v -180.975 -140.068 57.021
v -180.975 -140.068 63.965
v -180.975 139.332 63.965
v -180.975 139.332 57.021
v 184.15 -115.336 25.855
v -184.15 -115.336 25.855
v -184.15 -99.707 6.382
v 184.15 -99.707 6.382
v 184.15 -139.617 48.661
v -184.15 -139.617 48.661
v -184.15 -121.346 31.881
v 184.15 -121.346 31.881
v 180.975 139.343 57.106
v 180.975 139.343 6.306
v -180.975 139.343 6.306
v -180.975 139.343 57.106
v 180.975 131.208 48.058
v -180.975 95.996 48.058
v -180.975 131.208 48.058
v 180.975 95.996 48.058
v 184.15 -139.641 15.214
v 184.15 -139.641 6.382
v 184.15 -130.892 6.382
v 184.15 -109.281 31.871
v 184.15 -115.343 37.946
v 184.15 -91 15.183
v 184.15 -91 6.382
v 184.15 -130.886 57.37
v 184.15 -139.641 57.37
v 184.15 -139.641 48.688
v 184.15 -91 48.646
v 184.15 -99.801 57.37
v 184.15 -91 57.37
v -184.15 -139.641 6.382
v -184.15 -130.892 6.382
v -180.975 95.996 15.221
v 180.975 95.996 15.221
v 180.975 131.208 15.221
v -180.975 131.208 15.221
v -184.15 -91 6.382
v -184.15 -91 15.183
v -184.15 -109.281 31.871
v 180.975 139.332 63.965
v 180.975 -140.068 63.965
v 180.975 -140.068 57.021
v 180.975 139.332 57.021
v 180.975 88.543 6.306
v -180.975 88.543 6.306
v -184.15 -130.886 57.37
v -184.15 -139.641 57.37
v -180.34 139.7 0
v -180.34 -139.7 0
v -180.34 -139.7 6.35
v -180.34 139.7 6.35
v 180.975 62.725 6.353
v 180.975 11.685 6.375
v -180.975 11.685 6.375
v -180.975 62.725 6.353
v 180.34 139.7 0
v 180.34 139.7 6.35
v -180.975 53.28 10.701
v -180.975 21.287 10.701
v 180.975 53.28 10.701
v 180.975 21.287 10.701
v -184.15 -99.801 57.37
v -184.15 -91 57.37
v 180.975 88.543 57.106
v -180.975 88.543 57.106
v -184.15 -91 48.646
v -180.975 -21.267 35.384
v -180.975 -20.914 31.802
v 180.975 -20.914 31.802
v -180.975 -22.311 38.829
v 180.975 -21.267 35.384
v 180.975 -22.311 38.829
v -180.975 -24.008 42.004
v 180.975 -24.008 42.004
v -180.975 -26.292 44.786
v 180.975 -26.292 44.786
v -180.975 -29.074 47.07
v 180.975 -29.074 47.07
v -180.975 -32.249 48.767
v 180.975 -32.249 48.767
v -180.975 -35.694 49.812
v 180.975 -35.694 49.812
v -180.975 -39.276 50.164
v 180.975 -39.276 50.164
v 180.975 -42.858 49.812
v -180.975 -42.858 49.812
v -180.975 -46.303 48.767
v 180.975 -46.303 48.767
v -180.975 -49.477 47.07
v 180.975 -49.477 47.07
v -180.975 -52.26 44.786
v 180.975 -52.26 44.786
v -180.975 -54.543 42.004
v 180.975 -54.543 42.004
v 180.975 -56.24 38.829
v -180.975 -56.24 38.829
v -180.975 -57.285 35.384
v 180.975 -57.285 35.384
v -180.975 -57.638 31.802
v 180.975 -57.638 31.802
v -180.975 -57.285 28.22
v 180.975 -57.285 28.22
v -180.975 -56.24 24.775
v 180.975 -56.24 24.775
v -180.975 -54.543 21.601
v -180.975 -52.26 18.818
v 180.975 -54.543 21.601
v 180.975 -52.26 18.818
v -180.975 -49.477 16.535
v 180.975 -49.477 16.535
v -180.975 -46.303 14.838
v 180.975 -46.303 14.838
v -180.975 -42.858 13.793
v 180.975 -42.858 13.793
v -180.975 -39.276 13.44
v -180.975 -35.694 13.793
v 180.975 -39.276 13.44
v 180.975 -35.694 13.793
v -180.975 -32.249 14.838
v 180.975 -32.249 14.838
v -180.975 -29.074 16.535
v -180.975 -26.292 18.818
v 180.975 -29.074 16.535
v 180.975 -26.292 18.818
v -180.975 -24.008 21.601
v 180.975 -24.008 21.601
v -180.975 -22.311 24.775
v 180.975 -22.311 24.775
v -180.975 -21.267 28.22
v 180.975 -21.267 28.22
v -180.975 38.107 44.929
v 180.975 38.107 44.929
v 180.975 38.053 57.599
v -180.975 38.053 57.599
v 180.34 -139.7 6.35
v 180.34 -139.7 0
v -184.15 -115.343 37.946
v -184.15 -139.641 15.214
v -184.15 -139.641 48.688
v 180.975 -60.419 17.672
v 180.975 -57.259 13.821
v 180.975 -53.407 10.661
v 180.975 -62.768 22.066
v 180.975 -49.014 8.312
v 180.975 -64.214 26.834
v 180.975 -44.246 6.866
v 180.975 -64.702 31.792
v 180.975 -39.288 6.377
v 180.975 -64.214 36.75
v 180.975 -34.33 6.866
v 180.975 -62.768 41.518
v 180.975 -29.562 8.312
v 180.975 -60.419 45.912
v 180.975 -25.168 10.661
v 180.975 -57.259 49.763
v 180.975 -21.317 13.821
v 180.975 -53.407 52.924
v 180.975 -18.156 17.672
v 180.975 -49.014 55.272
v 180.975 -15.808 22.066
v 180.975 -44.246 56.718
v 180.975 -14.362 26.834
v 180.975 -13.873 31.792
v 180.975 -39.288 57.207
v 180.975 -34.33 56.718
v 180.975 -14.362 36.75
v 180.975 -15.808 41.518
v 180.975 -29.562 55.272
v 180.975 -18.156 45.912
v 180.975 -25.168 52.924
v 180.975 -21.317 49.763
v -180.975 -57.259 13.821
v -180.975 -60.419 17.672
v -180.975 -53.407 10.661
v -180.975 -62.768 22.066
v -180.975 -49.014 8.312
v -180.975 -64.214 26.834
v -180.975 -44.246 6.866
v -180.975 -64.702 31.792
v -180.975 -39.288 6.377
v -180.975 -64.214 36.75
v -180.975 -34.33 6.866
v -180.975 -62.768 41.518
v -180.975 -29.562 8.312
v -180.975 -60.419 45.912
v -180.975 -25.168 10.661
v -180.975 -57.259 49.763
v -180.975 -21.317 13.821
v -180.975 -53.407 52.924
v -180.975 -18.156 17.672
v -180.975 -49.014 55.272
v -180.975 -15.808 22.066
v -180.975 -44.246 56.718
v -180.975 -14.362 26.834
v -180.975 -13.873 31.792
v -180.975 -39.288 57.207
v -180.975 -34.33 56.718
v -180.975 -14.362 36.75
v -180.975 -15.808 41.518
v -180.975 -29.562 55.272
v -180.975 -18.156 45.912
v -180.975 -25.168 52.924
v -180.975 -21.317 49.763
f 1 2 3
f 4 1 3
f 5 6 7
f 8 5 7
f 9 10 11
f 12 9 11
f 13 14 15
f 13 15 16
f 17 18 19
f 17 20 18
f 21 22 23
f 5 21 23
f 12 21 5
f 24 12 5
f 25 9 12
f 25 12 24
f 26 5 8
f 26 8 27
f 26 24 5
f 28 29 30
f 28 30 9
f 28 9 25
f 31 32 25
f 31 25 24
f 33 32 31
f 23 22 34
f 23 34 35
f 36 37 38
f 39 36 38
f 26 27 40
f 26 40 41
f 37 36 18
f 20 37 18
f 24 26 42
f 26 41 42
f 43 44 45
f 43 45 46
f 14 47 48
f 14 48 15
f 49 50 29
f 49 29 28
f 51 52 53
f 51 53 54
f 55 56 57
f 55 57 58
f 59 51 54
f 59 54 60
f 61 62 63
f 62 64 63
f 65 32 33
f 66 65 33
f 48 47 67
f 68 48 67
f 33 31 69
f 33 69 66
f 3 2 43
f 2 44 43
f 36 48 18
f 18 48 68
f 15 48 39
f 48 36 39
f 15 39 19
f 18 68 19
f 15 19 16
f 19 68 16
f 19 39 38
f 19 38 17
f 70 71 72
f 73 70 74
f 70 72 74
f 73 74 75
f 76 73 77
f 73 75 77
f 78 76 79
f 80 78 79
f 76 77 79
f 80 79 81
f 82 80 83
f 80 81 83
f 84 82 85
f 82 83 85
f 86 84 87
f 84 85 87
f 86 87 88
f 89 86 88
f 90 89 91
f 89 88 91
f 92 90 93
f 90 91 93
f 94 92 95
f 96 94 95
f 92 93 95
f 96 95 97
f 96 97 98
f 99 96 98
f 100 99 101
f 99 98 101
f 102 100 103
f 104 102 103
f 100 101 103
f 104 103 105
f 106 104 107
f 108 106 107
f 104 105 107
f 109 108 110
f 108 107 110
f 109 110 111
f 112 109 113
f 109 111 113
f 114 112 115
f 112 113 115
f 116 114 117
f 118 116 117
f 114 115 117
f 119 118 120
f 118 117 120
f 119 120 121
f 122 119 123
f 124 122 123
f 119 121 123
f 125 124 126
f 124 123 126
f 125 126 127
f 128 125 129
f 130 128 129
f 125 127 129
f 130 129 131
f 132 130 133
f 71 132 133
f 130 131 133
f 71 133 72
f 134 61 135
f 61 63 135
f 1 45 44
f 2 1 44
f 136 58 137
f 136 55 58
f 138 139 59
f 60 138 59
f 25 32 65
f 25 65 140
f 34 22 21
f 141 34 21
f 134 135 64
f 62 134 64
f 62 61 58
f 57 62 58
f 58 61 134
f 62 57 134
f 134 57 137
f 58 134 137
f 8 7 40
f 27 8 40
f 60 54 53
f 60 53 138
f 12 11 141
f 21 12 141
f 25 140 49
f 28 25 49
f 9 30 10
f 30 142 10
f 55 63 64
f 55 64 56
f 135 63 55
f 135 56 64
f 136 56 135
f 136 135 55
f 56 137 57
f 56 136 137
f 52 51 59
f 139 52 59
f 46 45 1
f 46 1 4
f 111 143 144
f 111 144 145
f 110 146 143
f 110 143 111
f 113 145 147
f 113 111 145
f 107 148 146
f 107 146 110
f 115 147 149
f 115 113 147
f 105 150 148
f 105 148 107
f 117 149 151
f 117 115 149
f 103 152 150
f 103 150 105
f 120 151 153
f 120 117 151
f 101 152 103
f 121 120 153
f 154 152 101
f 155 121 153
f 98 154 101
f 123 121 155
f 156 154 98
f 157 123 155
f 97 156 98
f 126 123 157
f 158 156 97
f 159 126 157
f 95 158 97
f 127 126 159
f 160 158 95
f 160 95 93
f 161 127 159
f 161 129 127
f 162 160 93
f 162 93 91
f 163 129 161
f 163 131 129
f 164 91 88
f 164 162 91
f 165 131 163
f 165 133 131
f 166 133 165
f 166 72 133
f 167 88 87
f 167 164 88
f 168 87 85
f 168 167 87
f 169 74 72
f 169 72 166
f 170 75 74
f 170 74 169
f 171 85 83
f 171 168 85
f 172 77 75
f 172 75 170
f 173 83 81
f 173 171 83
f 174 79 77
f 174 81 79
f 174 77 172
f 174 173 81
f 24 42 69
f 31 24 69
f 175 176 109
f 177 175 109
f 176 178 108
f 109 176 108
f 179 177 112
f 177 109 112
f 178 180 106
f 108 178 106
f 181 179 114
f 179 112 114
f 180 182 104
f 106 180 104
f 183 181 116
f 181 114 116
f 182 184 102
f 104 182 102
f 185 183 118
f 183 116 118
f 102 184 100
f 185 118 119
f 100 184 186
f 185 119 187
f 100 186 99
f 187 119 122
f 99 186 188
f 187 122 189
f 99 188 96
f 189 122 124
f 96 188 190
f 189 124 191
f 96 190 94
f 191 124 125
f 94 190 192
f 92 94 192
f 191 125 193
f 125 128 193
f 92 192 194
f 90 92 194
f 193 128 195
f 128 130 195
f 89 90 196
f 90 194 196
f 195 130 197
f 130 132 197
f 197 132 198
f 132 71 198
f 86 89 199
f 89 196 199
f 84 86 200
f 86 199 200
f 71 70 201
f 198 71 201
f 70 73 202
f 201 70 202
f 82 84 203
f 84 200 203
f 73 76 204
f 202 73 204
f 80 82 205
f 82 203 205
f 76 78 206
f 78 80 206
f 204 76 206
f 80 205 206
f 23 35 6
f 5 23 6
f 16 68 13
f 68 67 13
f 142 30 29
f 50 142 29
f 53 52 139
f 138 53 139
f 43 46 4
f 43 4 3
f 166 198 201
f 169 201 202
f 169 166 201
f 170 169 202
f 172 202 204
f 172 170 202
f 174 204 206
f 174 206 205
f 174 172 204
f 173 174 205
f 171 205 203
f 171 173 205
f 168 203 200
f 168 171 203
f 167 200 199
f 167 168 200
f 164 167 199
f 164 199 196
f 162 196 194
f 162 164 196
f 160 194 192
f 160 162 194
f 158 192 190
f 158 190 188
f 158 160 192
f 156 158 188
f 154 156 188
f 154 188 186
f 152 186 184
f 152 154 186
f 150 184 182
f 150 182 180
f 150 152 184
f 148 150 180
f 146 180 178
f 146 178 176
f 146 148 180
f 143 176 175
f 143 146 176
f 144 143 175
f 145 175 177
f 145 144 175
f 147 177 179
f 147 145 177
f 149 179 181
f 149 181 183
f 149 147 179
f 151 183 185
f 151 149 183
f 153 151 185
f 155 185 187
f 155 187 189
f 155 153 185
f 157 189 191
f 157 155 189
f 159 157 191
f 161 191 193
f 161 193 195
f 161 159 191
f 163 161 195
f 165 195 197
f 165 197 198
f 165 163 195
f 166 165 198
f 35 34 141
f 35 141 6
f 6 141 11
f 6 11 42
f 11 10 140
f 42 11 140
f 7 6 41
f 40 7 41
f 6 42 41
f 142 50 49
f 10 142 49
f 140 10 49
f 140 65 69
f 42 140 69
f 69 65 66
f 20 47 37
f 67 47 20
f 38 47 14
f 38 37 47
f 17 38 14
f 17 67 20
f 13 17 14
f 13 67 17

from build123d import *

# Parameters (mm, degrees)
F0_W      = 360.68
F0_H      = 279.4
F1_DEPTH  = 6.35
F2_W      = 50.8
F2_H      = 50.8
F3_DEPTH  = 180.975
F5_DEPTH  = 180.975
F6_W      = 35.2113991976
F6_H      = 32.8375957906
F7_DEPTH  = 180.975
F9_DEPTH  = 180.975
F10_R     = 25.414603267
F12_DEPTH = 180.975
F11_R     = 18.362153416
F13_DEPTH = 180.975
F14_W     = 48.641
F14_H     = 50.9879244491
F15_DEPTH = 184.15
F17_DEPTH = 368.3
F22_DEPTH = 381
F23_DEPTH = 381
F24_DEPTH = 381
F25_W     = 279.4
F25_H     = 6.9440653814
F26_DEPTH = 180.975


with BuildPart() as f1:
    # F0 (on Top) → F1 (new body)
    with BuildSketch(Plane.XY):
        Rectangle(F0_W, F0_H)
    extrude(amount=F1_DEPTH)


with BuildPart() as f3:
    # F2 (on Right) → F3 (new body, symmetric)
    with BuildSketch(Plane.YZ):
        with Locations((113.9425359011, 31.7058333471)):
            Rectangle(F2_W, F2_H)
    extrude(amount=F3_DEPTH, both=True)

    # F6 (on Right) → F7 (cut, symmetric)
    with BuildSketch(Plane.YZ):
        with Locations((113.6018633842, 31.6396355629)):
            Rectangle(F6_W, F6_H)
    extrude(amount=F7_DEPTH, both=True, mode=Mode.SUBTRACT)


with BuildPart() as f5:
    # F4 (on Right) → F5 (new body, symmetric)
    with BuildSketch(Plane.YZ):
        Polygon((38.0530171096, 57.5986728072), (11.6845108569, 6.3749314286), (62.7245157957, 6.3526430167), align=None)
    extrude(amount=F5_DEPTH, both=True)

    # F8 (on Right) → F9 (cut, symmetric)
    with BuildSketch(Plane.YZ):
        Polygon((53.2804466784, 10.7010677457), (38.1071306765, 44.9292398989), (21.2871003896, 10.7010677457), align=None)
    extrude(amount=F9_DEPTH, both=True, mode=Mode.SUBTRACT)


with BuildPart() as f12:
    # F10 (on Right) → F12 (new body, symmetric)
    with BuildSketch(Plane.YZ):
        with Locations((-39.2878577113, 31.7920409143)):
            Circle(F10_R)
    extrude(amount=F12_DEPTH, both=True)

    # F11 (on Right) → F13 (cut, symmetric)
    with BuildSketch(Plane.YZ):
        with Locations((-39.2758585513, 31.8021848798)):
            Circle(F11_R)
    extrude(amount=F13_DEPTH, both=True, mode=Mode.SUBTRACT)


with BuildPart() as f15:
    # F14 (on Right) → F15 (new body, symmetric)
    with BuildSketch(Plane.YZ):
        with Locations((-115.3208594484, 31.875770539)):
            Rectangle(F14_W, F14_H)
    extrude(amount=F15_DEPTH, both=True)

    # F16 (on face) → F17 (cut, symmetric)
    with BuildSketch(Plane(origin=(-184.15, 0, 0), x_dir=(0, -1, 0), z_dir=(-1, 0, 0))):
        Polygon((130.8860778809, 57.3697327636), (99.8007804155, 57.3697327636), (115.3434291482, 37.9464551806), align=None)
    extrude(amount=F17_DEPTH, both=True, mode=Mode.SUBTRACT)

    # F21 (on face) → F22 (cut, symmetric)
    with BuildSketch(Plane(origin=(-184.15, 0, 0), x_dir=(0, -1, 0), z_dir=(-1, 0, 0))):
        Polygon((139.6998167038, 48.7534217536), (139.6171450615, 48.6609376967), (121.3458627462, 31.8812094629), (139.6998167038, 15.1609433815), (139.6998167038, 48.6609376967), (139.6998167038, 48.7179011106), align=None)
    extrude(amount=F22_DEPTH, both=True, mode=Mode.SUBTRACT)

    # F20 (on face) → F23 (cut, symmetric)
    with BuildSketch(Plane(origin=(-184.15, 0, 0), x_dir=(0, -1, 0), z_dir=(-1, 0, 0))):
        Polygon((109.2811301351, 31.8714790046), (90.9482911229, 48.6935228109), (90.9860432148, 15.1703031734), align=None)
    extrude(amount=F23_DEPTH, both=True, mode=Mode.SUBTRACT)

    # F19 (on face) → F24 (cut, symmetric)
    with BuildSketch(Plane(origin=(-184.15, 0, 0), x_dir=(0, -1, 0), z_dir=(-1, 0, 0))):
        Polygon((115.3363063931, 25.8554723114), (99.7065967548, 6.3818083145), (130.8921417904, 6.3818083145), align=None)
    extrude(amount=F24_DEPTH, both=True, mode=Mode.SUBTRACT)


with BuildPart() as f26:
    # F25 (on Right) → F26 (new body, symmetric)
    with BuildSketch(Plane.YZ):
        with Locations((-0.3675696945, 60.4931823909)):
            Rectangle(F25_W, F25_H)
    extrude(amount=F26_DEPTH, both=True)


solid = Compound([f1.part, f3.part, f5.part, f12.part, f15.part, f26.part])
